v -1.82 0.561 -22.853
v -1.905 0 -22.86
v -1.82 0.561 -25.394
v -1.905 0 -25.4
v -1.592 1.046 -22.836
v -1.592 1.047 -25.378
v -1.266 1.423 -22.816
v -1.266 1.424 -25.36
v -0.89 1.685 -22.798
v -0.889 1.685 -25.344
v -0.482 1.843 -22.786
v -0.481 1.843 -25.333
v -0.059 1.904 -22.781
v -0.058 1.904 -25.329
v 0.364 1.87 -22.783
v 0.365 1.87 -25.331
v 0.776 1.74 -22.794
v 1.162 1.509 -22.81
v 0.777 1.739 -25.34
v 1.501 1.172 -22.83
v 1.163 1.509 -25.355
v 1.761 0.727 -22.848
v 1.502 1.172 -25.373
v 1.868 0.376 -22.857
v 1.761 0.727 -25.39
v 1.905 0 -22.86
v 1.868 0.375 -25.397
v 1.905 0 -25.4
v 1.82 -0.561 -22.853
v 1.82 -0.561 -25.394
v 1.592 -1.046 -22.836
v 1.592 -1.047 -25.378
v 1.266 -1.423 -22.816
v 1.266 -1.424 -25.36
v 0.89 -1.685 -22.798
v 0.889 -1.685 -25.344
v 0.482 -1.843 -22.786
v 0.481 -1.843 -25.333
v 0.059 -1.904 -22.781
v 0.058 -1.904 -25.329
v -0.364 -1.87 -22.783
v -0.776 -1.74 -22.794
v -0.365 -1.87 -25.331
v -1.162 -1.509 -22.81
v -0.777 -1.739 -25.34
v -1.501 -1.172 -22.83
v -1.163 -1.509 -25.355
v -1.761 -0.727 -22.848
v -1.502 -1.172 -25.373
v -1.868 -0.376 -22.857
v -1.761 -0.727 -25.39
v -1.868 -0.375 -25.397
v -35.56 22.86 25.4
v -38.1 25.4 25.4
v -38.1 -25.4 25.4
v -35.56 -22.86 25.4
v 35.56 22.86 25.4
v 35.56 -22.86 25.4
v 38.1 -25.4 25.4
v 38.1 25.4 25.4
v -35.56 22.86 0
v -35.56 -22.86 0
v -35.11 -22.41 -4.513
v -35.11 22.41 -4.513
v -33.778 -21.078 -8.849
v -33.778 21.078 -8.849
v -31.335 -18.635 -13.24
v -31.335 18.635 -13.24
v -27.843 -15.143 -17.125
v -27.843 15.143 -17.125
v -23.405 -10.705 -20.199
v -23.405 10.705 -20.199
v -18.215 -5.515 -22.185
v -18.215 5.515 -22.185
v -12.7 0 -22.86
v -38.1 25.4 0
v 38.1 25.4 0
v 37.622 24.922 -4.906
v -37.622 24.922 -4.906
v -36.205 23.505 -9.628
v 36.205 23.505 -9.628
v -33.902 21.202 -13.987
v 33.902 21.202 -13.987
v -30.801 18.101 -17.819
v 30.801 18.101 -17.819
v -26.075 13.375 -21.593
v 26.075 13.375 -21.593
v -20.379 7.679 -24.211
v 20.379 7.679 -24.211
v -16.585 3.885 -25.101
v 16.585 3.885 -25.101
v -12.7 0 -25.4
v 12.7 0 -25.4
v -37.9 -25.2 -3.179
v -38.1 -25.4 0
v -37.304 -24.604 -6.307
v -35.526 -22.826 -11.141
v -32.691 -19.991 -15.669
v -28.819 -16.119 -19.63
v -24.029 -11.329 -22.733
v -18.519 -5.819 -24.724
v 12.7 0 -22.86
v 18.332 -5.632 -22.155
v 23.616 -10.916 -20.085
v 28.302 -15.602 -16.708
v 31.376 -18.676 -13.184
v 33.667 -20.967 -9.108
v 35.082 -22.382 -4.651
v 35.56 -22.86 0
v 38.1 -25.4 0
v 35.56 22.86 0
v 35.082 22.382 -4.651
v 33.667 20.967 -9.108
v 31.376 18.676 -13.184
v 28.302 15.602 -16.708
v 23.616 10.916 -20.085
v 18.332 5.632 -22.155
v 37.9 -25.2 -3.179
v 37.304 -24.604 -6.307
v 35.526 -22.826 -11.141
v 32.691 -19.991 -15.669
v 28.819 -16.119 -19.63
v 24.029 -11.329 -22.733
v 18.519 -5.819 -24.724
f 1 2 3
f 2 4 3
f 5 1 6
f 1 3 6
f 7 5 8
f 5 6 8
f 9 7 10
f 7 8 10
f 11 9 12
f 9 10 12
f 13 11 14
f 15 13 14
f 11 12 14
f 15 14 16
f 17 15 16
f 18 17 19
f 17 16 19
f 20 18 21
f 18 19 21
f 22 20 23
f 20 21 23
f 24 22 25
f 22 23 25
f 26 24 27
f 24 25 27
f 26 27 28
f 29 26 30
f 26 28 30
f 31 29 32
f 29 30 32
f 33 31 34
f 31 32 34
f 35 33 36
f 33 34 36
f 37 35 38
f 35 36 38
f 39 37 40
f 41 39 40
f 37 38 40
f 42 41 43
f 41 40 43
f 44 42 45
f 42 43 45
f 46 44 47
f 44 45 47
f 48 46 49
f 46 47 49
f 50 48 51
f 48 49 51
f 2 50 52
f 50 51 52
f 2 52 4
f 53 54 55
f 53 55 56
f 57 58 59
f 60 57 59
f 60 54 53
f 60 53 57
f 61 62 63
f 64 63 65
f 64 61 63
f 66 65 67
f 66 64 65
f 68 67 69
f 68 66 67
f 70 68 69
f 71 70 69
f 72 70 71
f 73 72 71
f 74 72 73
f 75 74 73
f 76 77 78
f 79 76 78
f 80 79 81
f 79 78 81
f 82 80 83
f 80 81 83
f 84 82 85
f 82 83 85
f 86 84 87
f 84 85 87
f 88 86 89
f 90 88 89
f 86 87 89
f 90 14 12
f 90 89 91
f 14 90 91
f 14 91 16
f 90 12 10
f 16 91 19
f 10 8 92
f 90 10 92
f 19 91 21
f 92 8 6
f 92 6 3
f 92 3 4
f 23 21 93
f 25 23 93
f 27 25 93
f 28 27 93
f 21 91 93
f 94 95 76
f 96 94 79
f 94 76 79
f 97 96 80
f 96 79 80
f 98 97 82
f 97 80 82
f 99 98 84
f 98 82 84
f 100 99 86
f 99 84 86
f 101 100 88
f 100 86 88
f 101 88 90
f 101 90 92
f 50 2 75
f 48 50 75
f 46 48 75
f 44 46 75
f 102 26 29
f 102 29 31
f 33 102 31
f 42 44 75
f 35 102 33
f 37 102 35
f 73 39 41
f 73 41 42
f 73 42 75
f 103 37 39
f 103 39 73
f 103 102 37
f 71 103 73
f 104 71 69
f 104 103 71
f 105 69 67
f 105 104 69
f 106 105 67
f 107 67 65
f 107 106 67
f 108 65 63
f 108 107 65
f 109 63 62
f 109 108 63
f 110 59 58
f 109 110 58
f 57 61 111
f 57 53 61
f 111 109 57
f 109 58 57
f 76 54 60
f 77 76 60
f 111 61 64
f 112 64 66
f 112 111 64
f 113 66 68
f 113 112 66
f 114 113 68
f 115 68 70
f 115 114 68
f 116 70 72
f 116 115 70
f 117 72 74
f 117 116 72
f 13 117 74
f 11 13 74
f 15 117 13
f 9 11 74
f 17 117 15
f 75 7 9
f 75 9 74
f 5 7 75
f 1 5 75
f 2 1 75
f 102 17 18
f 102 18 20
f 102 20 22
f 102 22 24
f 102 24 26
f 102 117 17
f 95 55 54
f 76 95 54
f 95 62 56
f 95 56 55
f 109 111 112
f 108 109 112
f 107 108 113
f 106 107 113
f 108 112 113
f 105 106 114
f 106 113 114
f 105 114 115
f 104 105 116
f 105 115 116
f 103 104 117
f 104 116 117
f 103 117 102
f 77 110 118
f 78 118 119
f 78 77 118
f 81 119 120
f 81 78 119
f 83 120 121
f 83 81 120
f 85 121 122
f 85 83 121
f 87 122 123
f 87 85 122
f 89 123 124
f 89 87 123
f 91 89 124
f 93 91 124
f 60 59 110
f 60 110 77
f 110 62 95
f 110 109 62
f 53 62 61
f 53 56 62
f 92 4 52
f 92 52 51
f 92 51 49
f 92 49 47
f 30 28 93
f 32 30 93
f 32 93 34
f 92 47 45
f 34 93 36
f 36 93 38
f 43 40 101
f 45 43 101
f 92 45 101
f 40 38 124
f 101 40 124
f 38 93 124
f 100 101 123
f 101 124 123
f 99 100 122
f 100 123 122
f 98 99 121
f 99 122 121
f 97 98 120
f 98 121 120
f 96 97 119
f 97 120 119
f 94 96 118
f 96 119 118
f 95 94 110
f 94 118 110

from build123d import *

# Parameters (mm, degrees)
F0_W     = 76.2
F0_H     = 50.8
F1_DEPTH = 25.4
F2_DEPTH = 25.4
F3_R     = 25.39999
F4_T     = -2.54
F6_D     = 3.81
F8_DEPTH = 25.4


# Not quite as in the source:
# - a fillet or chamfer is up to 0.001 mm smaller than in the source, because OpenCascade refuses the exact size


with BuildPart() as f1:
    # F0 (on Top) → F1 (new body)
    with BuildSketch(Plane.XY):
        Rectangle(F0_W, F0_H)
    extrude(amount=F1_DEPTH)

    # F2 (add): a face of the model
    f2_faces = [f1.faces().sort_by_distance(p)[0] for p in [
        (0, 0, 0),
    ]]
    extrude(f2_faces, amount=F2_DEPTH)

    # F3 (radius 25.4 in the source; OpenCascade refuses exactly that, so slightly less here)
    f3_edges = [f1.edges().sort_by_distance(p)[0] for p in [
        (0, -25.4, -25.4),
        (38.1, 0, -25.4),
        (0, 25.4, -25.4),
        (-38.1, 0, -25.4),
    ]]
    fillet(f3_edges, radius=F3_R)

    # F4
    f4_openings = [f1.faces().sort_by_distance(p)[0] for p in [
        (0, 0, 25.4),
    ]]
    offset(amount=F4_T, openings=f4_openings)

    # F6 (through all)
    with Locations(Plane.XY):
        with Locations((0, 0)):
            Hole(F6_D / 2)

    # F7 (on face) → F8 (cut)
    with BuildSketch(Plane.XY.offset(25.4)):
        Polygon((-35.56, -22.86), (-38.1, -25.4), (38.1, -25.4), (35.56, -22.86), align=None)
    extrude(amount=-F8_DEPTH, mode=Mode.SUBTRACT)


solid = f1.part
